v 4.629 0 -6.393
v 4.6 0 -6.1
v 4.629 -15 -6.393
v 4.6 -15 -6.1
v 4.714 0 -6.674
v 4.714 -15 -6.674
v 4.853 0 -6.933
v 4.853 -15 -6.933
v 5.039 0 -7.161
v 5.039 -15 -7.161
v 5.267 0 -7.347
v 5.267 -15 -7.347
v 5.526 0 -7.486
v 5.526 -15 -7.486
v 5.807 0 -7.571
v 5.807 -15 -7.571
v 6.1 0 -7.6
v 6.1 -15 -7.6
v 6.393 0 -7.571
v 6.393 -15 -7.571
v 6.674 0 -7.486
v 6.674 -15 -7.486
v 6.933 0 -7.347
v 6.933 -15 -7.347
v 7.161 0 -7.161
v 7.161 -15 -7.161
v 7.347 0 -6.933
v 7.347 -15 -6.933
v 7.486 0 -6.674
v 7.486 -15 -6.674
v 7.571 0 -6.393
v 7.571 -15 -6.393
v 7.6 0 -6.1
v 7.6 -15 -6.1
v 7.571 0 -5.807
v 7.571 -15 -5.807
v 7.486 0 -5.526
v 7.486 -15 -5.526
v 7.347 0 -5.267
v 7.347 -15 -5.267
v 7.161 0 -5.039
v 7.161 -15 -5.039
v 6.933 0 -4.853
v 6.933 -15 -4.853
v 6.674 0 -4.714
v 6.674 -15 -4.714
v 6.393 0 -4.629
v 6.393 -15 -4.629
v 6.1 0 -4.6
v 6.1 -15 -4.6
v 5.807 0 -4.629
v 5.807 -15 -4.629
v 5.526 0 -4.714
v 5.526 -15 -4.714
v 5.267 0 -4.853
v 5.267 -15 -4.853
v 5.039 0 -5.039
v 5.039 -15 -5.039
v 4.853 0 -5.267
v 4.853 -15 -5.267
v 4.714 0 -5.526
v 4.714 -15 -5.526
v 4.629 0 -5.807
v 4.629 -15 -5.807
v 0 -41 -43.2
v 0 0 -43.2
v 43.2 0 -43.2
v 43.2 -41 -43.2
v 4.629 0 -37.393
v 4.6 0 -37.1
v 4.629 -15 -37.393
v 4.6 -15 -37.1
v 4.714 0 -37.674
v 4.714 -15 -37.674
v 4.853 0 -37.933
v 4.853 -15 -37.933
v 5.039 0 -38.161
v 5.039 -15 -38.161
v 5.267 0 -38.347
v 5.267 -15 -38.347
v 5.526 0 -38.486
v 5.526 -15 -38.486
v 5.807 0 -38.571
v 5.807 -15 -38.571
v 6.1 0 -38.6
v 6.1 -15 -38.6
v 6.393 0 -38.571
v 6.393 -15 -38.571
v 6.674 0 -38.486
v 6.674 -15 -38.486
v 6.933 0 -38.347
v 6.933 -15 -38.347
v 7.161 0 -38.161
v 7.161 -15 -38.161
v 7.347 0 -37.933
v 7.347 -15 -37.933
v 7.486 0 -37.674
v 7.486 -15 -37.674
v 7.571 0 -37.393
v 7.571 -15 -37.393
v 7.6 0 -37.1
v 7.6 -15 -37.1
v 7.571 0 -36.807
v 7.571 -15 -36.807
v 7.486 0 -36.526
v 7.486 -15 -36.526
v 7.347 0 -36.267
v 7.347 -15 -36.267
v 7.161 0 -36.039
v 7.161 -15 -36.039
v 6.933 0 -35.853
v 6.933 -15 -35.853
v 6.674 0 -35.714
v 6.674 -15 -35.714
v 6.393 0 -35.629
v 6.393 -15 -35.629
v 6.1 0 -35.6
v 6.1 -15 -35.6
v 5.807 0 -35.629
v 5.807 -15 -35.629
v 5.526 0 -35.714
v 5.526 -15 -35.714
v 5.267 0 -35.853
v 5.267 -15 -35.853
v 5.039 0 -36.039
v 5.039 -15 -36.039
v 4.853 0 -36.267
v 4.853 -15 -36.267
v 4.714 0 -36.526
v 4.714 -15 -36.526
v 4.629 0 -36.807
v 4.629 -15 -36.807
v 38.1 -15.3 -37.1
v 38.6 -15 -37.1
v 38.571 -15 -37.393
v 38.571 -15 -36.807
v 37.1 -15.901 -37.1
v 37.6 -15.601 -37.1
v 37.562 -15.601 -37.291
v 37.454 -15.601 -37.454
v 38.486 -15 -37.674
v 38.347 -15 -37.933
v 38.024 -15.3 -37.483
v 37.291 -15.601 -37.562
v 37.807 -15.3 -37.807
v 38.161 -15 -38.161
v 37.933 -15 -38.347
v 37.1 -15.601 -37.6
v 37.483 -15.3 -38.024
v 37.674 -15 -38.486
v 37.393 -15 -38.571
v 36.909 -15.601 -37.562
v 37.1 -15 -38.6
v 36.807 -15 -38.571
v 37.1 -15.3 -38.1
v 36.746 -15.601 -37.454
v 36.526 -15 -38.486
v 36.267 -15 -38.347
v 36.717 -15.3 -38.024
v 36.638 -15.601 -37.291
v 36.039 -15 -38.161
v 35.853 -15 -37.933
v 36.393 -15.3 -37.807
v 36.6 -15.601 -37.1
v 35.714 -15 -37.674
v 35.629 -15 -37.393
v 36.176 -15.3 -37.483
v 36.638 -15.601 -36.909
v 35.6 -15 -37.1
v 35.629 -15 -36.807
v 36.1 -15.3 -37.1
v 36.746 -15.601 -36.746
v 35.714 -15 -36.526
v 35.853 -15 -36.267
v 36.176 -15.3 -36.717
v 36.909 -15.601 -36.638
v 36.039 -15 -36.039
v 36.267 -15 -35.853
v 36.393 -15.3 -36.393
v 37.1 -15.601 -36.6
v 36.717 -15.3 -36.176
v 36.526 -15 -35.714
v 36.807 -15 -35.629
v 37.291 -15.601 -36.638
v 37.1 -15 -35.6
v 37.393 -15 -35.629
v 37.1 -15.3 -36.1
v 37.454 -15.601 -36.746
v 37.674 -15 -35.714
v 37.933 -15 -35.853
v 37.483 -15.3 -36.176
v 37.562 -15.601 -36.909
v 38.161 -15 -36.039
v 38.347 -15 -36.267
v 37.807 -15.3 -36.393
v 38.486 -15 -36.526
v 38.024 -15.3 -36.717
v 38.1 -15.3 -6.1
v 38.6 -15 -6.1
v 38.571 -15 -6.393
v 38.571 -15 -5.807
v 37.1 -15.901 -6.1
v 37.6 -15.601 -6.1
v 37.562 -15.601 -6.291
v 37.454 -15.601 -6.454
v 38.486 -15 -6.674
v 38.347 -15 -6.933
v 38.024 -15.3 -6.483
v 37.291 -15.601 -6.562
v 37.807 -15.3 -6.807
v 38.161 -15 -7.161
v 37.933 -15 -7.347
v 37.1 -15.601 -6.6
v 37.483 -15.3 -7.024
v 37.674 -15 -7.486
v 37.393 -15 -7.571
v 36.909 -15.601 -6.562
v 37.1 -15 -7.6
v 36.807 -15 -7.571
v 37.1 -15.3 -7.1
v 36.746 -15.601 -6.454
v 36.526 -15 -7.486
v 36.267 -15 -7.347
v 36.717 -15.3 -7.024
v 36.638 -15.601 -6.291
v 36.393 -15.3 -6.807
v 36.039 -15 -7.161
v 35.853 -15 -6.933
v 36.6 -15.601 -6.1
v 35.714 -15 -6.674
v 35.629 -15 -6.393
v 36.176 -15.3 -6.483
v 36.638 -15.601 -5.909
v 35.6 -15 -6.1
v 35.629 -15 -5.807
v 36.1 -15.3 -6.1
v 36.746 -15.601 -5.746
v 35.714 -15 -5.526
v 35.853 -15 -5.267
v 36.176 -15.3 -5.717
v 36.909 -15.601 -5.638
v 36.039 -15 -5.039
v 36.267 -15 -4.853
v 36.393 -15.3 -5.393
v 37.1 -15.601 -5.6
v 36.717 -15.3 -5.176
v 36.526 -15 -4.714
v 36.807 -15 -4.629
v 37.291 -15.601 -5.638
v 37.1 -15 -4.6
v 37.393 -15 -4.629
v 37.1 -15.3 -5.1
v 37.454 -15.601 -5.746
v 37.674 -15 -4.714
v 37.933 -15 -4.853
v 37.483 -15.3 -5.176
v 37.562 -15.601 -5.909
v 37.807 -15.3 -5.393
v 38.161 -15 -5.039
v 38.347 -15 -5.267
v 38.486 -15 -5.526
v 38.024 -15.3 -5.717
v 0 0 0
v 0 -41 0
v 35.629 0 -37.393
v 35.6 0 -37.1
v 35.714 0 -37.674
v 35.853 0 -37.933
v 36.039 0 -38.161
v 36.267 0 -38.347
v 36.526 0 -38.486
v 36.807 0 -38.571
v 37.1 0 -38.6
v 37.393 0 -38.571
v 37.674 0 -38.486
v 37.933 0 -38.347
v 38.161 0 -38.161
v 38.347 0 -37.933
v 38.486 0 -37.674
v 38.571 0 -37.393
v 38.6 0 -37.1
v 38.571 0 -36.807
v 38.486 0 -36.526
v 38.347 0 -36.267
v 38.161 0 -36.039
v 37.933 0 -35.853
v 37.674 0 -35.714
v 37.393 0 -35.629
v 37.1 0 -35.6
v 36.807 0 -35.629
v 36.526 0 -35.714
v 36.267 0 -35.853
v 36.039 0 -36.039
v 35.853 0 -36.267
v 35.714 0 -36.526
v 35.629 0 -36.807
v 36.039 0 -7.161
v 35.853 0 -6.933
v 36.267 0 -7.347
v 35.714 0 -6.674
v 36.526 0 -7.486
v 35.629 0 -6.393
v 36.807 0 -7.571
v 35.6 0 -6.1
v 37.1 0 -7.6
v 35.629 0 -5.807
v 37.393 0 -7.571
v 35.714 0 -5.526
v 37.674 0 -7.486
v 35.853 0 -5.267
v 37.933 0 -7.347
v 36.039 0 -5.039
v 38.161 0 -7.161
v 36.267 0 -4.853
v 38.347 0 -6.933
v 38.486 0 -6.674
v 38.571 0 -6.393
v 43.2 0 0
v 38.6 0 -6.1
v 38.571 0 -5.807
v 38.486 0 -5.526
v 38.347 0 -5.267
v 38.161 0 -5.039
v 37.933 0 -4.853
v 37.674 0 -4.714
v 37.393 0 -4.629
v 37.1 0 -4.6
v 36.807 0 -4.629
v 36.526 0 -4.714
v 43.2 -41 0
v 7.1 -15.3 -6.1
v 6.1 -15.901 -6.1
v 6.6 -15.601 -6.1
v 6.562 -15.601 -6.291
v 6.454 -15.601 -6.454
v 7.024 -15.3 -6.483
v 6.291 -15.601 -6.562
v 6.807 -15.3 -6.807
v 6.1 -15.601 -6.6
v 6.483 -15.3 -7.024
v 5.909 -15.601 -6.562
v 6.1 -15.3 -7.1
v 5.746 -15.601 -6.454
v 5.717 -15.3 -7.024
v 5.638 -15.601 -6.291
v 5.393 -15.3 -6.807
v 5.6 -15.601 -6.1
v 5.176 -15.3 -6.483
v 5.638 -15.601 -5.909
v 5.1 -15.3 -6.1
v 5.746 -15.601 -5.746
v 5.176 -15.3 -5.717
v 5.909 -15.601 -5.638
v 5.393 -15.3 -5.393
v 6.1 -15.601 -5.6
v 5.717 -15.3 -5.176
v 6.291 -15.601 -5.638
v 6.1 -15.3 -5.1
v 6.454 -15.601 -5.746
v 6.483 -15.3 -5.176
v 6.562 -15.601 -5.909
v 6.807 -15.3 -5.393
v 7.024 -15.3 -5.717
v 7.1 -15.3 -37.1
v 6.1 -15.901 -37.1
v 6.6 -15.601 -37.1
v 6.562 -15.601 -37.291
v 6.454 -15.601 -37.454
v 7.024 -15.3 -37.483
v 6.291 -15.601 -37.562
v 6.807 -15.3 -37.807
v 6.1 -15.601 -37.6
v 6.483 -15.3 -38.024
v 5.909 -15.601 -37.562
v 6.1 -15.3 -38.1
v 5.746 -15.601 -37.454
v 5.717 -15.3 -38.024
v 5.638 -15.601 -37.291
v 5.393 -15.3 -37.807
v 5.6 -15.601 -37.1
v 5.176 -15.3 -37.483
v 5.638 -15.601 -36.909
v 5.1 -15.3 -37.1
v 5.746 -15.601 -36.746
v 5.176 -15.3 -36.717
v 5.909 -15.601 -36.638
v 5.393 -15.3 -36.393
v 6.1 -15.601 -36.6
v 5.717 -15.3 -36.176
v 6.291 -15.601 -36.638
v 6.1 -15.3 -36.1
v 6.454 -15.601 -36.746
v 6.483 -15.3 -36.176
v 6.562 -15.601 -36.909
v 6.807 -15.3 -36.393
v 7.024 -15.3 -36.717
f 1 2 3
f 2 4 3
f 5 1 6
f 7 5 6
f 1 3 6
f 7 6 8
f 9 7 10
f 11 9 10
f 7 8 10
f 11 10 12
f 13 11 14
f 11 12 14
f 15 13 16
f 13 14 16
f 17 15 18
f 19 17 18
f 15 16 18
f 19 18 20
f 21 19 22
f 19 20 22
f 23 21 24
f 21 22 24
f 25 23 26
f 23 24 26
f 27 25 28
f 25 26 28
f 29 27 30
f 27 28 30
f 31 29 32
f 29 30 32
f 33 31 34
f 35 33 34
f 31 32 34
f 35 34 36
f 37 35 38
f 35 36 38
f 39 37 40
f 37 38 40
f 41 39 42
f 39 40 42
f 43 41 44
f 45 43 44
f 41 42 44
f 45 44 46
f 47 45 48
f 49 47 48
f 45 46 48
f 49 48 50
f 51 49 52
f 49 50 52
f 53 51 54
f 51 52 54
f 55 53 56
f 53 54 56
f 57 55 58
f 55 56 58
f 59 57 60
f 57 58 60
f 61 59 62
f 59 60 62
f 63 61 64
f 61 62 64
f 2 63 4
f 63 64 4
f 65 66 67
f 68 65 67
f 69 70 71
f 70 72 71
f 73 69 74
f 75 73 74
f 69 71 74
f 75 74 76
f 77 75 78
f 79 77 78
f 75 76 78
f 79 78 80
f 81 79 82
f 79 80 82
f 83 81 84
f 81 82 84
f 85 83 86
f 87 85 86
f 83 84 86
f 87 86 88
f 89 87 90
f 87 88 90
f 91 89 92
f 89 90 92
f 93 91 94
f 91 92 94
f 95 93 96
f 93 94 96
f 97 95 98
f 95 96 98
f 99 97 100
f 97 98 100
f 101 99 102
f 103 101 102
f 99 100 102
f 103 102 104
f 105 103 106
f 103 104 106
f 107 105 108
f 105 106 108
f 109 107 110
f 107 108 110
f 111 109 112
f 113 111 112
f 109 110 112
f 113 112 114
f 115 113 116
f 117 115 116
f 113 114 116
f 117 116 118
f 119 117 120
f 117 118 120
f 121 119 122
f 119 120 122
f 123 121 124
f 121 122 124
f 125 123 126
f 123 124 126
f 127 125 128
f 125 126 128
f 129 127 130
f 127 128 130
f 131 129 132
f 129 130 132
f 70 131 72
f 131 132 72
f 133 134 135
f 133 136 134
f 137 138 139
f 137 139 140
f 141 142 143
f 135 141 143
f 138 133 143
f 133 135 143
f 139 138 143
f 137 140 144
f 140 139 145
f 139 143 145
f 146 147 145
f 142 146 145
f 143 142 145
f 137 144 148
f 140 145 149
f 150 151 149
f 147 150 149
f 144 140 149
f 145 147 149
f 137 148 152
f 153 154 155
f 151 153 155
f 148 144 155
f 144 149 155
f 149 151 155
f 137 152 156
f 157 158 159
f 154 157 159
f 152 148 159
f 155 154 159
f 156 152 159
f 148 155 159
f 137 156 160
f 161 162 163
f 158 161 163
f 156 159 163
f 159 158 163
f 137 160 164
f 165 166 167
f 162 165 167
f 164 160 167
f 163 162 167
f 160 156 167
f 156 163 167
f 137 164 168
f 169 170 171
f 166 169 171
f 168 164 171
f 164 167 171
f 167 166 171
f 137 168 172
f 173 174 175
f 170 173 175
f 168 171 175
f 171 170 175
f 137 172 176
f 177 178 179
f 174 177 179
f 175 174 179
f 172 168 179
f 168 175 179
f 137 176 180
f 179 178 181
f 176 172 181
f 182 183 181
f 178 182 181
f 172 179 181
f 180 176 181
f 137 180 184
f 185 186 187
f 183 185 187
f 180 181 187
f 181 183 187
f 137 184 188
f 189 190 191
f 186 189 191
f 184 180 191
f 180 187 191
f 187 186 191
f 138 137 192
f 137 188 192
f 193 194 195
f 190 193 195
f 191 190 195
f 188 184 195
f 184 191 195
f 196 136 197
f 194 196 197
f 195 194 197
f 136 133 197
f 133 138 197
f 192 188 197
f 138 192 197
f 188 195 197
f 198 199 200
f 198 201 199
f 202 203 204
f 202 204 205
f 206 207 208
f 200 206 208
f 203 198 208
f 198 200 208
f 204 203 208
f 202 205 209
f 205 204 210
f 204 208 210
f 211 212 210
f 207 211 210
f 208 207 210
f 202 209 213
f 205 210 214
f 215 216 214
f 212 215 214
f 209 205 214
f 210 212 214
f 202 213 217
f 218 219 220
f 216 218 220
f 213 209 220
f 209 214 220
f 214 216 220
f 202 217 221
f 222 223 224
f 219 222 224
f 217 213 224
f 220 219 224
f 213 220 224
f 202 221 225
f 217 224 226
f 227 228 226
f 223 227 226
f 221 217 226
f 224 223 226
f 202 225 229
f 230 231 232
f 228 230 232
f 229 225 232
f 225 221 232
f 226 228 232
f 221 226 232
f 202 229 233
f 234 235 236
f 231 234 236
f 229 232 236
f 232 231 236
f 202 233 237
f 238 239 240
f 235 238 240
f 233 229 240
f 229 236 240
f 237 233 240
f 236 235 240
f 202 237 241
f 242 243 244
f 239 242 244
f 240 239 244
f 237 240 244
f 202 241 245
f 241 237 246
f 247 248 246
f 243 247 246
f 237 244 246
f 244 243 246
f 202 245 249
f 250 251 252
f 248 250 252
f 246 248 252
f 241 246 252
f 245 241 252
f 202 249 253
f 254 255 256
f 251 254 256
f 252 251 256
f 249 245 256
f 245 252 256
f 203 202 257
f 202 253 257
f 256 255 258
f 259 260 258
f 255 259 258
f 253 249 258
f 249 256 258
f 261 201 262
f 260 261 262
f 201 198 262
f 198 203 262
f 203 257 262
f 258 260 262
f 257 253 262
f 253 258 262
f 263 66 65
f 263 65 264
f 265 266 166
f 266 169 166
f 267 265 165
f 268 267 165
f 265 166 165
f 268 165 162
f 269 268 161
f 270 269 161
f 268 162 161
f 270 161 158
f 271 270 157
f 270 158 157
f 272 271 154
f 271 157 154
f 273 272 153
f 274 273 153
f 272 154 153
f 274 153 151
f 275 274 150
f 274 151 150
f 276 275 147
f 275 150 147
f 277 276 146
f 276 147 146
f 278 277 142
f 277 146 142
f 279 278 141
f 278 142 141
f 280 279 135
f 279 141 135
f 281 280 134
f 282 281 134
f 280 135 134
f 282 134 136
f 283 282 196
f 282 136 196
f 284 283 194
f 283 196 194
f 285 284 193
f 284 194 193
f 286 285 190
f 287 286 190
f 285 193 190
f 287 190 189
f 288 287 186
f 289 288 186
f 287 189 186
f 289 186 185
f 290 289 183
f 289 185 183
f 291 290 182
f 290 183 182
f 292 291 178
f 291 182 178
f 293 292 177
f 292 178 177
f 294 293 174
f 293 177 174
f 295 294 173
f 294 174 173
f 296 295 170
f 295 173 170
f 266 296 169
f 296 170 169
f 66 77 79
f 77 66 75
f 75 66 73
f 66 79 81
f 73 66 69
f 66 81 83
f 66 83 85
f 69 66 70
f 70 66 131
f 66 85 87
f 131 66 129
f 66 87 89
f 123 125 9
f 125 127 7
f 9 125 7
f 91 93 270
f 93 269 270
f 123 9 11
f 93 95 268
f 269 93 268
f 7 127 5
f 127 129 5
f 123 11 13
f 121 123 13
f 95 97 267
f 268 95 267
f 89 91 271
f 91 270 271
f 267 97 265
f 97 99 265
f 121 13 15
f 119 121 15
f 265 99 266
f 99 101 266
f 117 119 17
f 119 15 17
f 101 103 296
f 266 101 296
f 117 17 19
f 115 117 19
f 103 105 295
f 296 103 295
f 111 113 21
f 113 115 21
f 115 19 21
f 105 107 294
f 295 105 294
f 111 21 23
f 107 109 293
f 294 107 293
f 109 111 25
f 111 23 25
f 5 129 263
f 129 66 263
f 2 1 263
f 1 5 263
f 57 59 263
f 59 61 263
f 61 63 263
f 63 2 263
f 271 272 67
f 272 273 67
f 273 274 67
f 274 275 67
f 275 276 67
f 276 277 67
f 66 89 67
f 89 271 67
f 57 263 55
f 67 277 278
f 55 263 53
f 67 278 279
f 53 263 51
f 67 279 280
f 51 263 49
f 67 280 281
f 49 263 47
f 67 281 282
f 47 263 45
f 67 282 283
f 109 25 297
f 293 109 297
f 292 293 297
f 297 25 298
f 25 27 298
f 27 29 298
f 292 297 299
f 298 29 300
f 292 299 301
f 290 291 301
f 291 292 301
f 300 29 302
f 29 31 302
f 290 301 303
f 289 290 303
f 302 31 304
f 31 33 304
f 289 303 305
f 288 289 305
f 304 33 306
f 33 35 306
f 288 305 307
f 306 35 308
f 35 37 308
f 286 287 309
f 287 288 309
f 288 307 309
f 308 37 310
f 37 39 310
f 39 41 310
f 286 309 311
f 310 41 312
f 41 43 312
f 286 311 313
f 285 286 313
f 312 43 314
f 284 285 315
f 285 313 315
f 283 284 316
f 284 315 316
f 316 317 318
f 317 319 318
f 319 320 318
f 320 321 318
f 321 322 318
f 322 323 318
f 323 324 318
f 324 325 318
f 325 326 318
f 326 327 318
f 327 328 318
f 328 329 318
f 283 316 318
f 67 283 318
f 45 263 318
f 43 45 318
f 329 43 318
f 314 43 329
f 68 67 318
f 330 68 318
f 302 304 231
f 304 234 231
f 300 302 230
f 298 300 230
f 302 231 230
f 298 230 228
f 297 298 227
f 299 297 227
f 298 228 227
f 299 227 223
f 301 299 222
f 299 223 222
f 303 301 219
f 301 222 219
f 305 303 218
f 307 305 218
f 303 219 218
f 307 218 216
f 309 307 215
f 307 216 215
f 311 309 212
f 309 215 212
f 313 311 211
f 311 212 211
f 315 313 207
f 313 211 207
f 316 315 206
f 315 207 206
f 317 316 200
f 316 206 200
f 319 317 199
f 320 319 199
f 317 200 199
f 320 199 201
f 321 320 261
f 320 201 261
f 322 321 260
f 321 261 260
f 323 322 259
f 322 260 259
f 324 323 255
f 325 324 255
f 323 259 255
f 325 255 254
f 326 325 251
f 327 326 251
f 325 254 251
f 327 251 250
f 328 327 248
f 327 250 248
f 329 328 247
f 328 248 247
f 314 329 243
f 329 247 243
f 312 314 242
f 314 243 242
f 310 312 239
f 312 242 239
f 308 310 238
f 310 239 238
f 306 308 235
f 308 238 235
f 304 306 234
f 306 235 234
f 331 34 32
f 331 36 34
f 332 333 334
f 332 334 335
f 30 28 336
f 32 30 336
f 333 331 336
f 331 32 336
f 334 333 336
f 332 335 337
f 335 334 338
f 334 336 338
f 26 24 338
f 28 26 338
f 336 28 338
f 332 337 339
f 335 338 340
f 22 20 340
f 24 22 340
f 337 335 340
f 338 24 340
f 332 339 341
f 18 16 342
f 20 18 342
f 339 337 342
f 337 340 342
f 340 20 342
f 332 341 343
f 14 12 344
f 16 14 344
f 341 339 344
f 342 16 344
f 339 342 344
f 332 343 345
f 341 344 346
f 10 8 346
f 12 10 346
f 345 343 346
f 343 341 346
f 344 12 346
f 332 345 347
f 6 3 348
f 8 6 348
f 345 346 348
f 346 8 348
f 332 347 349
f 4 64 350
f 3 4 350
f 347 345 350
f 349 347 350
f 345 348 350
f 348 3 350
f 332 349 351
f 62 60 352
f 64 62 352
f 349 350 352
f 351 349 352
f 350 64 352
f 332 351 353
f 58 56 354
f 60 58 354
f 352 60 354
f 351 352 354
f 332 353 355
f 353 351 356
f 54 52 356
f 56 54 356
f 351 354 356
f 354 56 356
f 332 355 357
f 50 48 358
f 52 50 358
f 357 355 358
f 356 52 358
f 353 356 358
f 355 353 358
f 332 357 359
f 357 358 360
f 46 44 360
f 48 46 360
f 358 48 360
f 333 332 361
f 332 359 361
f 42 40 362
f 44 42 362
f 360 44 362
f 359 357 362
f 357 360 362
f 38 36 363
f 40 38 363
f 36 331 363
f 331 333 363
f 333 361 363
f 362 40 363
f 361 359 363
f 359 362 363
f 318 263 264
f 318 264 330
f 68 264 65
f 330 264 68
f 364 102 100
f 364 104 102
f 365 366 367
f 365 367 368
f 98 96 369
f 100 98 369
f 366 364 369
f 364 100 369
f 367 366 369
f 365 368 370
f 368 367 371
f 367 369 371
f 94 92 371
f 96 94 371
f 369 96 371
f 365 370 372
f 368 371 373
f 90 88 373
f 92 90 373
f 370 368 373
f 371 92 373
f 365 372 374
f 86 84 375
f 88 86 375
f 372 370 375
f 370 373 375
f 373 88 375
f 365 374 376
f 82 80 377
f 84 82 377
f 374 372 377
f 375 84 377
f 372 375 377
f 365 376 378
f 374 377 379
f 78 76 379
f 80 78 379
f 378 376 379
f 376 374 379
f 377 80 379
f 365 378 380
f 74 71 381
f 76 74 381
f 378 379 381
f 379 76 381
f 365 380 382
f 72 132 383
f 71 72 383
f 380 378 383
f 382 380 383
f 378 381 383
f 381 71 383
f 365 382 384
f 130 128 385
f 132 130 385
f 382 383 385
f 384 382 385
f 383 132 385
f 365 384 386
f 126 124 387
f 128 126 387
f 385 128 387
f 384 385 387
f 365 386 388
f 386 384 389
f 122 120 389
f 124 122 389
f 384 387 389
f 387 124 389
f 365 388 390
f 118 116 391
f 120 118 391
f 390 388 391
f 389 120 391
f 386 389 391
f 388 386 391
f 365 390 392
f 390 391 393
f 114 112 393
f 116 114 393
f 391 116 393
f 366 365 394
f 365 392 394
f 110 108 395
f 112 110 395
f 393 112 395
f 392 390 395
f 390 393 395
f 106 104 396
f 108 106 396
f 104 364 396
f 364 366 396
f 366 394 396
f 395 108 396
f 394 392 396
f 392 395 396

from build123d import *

# Parameters (mm, degrees)
F0_W     = 43.2
F0_H     = 43.2
F1_DEPTH = 41
F2_D     = 3
F2_DEPTH = 15
F2_TIP   = 0.9012909285


with BuildPart() as f1:
    # F0 (on Front) → F1 (new body)
    with BuildSketch(Plane.XZ):
        with Locations((21.6, -21.6)):
            Rectangle(F0_W, F0_H)
    extrude(amount=F1_DEPTH)

    # F2
    with Locations(Plane(origin=(0, 0, 0), x_dir=(1, 0, 0), z_dir=(0, 1, 0))):
        with Locations((37.1, 6.1), (6.1, 6.1), (6.1, 37.1), (37.1, 37.1)):
            Hole(F2_D / 2, depth=F2_DEPTH)
            with Locations((0, 0, -(F2_DEPTH + F2_TIP / 2))):  # 118° drill point
                Cone(0, F2_D / 2, F2_TIP, mode=Mode.SUBTRACT)


solid = f1.part
